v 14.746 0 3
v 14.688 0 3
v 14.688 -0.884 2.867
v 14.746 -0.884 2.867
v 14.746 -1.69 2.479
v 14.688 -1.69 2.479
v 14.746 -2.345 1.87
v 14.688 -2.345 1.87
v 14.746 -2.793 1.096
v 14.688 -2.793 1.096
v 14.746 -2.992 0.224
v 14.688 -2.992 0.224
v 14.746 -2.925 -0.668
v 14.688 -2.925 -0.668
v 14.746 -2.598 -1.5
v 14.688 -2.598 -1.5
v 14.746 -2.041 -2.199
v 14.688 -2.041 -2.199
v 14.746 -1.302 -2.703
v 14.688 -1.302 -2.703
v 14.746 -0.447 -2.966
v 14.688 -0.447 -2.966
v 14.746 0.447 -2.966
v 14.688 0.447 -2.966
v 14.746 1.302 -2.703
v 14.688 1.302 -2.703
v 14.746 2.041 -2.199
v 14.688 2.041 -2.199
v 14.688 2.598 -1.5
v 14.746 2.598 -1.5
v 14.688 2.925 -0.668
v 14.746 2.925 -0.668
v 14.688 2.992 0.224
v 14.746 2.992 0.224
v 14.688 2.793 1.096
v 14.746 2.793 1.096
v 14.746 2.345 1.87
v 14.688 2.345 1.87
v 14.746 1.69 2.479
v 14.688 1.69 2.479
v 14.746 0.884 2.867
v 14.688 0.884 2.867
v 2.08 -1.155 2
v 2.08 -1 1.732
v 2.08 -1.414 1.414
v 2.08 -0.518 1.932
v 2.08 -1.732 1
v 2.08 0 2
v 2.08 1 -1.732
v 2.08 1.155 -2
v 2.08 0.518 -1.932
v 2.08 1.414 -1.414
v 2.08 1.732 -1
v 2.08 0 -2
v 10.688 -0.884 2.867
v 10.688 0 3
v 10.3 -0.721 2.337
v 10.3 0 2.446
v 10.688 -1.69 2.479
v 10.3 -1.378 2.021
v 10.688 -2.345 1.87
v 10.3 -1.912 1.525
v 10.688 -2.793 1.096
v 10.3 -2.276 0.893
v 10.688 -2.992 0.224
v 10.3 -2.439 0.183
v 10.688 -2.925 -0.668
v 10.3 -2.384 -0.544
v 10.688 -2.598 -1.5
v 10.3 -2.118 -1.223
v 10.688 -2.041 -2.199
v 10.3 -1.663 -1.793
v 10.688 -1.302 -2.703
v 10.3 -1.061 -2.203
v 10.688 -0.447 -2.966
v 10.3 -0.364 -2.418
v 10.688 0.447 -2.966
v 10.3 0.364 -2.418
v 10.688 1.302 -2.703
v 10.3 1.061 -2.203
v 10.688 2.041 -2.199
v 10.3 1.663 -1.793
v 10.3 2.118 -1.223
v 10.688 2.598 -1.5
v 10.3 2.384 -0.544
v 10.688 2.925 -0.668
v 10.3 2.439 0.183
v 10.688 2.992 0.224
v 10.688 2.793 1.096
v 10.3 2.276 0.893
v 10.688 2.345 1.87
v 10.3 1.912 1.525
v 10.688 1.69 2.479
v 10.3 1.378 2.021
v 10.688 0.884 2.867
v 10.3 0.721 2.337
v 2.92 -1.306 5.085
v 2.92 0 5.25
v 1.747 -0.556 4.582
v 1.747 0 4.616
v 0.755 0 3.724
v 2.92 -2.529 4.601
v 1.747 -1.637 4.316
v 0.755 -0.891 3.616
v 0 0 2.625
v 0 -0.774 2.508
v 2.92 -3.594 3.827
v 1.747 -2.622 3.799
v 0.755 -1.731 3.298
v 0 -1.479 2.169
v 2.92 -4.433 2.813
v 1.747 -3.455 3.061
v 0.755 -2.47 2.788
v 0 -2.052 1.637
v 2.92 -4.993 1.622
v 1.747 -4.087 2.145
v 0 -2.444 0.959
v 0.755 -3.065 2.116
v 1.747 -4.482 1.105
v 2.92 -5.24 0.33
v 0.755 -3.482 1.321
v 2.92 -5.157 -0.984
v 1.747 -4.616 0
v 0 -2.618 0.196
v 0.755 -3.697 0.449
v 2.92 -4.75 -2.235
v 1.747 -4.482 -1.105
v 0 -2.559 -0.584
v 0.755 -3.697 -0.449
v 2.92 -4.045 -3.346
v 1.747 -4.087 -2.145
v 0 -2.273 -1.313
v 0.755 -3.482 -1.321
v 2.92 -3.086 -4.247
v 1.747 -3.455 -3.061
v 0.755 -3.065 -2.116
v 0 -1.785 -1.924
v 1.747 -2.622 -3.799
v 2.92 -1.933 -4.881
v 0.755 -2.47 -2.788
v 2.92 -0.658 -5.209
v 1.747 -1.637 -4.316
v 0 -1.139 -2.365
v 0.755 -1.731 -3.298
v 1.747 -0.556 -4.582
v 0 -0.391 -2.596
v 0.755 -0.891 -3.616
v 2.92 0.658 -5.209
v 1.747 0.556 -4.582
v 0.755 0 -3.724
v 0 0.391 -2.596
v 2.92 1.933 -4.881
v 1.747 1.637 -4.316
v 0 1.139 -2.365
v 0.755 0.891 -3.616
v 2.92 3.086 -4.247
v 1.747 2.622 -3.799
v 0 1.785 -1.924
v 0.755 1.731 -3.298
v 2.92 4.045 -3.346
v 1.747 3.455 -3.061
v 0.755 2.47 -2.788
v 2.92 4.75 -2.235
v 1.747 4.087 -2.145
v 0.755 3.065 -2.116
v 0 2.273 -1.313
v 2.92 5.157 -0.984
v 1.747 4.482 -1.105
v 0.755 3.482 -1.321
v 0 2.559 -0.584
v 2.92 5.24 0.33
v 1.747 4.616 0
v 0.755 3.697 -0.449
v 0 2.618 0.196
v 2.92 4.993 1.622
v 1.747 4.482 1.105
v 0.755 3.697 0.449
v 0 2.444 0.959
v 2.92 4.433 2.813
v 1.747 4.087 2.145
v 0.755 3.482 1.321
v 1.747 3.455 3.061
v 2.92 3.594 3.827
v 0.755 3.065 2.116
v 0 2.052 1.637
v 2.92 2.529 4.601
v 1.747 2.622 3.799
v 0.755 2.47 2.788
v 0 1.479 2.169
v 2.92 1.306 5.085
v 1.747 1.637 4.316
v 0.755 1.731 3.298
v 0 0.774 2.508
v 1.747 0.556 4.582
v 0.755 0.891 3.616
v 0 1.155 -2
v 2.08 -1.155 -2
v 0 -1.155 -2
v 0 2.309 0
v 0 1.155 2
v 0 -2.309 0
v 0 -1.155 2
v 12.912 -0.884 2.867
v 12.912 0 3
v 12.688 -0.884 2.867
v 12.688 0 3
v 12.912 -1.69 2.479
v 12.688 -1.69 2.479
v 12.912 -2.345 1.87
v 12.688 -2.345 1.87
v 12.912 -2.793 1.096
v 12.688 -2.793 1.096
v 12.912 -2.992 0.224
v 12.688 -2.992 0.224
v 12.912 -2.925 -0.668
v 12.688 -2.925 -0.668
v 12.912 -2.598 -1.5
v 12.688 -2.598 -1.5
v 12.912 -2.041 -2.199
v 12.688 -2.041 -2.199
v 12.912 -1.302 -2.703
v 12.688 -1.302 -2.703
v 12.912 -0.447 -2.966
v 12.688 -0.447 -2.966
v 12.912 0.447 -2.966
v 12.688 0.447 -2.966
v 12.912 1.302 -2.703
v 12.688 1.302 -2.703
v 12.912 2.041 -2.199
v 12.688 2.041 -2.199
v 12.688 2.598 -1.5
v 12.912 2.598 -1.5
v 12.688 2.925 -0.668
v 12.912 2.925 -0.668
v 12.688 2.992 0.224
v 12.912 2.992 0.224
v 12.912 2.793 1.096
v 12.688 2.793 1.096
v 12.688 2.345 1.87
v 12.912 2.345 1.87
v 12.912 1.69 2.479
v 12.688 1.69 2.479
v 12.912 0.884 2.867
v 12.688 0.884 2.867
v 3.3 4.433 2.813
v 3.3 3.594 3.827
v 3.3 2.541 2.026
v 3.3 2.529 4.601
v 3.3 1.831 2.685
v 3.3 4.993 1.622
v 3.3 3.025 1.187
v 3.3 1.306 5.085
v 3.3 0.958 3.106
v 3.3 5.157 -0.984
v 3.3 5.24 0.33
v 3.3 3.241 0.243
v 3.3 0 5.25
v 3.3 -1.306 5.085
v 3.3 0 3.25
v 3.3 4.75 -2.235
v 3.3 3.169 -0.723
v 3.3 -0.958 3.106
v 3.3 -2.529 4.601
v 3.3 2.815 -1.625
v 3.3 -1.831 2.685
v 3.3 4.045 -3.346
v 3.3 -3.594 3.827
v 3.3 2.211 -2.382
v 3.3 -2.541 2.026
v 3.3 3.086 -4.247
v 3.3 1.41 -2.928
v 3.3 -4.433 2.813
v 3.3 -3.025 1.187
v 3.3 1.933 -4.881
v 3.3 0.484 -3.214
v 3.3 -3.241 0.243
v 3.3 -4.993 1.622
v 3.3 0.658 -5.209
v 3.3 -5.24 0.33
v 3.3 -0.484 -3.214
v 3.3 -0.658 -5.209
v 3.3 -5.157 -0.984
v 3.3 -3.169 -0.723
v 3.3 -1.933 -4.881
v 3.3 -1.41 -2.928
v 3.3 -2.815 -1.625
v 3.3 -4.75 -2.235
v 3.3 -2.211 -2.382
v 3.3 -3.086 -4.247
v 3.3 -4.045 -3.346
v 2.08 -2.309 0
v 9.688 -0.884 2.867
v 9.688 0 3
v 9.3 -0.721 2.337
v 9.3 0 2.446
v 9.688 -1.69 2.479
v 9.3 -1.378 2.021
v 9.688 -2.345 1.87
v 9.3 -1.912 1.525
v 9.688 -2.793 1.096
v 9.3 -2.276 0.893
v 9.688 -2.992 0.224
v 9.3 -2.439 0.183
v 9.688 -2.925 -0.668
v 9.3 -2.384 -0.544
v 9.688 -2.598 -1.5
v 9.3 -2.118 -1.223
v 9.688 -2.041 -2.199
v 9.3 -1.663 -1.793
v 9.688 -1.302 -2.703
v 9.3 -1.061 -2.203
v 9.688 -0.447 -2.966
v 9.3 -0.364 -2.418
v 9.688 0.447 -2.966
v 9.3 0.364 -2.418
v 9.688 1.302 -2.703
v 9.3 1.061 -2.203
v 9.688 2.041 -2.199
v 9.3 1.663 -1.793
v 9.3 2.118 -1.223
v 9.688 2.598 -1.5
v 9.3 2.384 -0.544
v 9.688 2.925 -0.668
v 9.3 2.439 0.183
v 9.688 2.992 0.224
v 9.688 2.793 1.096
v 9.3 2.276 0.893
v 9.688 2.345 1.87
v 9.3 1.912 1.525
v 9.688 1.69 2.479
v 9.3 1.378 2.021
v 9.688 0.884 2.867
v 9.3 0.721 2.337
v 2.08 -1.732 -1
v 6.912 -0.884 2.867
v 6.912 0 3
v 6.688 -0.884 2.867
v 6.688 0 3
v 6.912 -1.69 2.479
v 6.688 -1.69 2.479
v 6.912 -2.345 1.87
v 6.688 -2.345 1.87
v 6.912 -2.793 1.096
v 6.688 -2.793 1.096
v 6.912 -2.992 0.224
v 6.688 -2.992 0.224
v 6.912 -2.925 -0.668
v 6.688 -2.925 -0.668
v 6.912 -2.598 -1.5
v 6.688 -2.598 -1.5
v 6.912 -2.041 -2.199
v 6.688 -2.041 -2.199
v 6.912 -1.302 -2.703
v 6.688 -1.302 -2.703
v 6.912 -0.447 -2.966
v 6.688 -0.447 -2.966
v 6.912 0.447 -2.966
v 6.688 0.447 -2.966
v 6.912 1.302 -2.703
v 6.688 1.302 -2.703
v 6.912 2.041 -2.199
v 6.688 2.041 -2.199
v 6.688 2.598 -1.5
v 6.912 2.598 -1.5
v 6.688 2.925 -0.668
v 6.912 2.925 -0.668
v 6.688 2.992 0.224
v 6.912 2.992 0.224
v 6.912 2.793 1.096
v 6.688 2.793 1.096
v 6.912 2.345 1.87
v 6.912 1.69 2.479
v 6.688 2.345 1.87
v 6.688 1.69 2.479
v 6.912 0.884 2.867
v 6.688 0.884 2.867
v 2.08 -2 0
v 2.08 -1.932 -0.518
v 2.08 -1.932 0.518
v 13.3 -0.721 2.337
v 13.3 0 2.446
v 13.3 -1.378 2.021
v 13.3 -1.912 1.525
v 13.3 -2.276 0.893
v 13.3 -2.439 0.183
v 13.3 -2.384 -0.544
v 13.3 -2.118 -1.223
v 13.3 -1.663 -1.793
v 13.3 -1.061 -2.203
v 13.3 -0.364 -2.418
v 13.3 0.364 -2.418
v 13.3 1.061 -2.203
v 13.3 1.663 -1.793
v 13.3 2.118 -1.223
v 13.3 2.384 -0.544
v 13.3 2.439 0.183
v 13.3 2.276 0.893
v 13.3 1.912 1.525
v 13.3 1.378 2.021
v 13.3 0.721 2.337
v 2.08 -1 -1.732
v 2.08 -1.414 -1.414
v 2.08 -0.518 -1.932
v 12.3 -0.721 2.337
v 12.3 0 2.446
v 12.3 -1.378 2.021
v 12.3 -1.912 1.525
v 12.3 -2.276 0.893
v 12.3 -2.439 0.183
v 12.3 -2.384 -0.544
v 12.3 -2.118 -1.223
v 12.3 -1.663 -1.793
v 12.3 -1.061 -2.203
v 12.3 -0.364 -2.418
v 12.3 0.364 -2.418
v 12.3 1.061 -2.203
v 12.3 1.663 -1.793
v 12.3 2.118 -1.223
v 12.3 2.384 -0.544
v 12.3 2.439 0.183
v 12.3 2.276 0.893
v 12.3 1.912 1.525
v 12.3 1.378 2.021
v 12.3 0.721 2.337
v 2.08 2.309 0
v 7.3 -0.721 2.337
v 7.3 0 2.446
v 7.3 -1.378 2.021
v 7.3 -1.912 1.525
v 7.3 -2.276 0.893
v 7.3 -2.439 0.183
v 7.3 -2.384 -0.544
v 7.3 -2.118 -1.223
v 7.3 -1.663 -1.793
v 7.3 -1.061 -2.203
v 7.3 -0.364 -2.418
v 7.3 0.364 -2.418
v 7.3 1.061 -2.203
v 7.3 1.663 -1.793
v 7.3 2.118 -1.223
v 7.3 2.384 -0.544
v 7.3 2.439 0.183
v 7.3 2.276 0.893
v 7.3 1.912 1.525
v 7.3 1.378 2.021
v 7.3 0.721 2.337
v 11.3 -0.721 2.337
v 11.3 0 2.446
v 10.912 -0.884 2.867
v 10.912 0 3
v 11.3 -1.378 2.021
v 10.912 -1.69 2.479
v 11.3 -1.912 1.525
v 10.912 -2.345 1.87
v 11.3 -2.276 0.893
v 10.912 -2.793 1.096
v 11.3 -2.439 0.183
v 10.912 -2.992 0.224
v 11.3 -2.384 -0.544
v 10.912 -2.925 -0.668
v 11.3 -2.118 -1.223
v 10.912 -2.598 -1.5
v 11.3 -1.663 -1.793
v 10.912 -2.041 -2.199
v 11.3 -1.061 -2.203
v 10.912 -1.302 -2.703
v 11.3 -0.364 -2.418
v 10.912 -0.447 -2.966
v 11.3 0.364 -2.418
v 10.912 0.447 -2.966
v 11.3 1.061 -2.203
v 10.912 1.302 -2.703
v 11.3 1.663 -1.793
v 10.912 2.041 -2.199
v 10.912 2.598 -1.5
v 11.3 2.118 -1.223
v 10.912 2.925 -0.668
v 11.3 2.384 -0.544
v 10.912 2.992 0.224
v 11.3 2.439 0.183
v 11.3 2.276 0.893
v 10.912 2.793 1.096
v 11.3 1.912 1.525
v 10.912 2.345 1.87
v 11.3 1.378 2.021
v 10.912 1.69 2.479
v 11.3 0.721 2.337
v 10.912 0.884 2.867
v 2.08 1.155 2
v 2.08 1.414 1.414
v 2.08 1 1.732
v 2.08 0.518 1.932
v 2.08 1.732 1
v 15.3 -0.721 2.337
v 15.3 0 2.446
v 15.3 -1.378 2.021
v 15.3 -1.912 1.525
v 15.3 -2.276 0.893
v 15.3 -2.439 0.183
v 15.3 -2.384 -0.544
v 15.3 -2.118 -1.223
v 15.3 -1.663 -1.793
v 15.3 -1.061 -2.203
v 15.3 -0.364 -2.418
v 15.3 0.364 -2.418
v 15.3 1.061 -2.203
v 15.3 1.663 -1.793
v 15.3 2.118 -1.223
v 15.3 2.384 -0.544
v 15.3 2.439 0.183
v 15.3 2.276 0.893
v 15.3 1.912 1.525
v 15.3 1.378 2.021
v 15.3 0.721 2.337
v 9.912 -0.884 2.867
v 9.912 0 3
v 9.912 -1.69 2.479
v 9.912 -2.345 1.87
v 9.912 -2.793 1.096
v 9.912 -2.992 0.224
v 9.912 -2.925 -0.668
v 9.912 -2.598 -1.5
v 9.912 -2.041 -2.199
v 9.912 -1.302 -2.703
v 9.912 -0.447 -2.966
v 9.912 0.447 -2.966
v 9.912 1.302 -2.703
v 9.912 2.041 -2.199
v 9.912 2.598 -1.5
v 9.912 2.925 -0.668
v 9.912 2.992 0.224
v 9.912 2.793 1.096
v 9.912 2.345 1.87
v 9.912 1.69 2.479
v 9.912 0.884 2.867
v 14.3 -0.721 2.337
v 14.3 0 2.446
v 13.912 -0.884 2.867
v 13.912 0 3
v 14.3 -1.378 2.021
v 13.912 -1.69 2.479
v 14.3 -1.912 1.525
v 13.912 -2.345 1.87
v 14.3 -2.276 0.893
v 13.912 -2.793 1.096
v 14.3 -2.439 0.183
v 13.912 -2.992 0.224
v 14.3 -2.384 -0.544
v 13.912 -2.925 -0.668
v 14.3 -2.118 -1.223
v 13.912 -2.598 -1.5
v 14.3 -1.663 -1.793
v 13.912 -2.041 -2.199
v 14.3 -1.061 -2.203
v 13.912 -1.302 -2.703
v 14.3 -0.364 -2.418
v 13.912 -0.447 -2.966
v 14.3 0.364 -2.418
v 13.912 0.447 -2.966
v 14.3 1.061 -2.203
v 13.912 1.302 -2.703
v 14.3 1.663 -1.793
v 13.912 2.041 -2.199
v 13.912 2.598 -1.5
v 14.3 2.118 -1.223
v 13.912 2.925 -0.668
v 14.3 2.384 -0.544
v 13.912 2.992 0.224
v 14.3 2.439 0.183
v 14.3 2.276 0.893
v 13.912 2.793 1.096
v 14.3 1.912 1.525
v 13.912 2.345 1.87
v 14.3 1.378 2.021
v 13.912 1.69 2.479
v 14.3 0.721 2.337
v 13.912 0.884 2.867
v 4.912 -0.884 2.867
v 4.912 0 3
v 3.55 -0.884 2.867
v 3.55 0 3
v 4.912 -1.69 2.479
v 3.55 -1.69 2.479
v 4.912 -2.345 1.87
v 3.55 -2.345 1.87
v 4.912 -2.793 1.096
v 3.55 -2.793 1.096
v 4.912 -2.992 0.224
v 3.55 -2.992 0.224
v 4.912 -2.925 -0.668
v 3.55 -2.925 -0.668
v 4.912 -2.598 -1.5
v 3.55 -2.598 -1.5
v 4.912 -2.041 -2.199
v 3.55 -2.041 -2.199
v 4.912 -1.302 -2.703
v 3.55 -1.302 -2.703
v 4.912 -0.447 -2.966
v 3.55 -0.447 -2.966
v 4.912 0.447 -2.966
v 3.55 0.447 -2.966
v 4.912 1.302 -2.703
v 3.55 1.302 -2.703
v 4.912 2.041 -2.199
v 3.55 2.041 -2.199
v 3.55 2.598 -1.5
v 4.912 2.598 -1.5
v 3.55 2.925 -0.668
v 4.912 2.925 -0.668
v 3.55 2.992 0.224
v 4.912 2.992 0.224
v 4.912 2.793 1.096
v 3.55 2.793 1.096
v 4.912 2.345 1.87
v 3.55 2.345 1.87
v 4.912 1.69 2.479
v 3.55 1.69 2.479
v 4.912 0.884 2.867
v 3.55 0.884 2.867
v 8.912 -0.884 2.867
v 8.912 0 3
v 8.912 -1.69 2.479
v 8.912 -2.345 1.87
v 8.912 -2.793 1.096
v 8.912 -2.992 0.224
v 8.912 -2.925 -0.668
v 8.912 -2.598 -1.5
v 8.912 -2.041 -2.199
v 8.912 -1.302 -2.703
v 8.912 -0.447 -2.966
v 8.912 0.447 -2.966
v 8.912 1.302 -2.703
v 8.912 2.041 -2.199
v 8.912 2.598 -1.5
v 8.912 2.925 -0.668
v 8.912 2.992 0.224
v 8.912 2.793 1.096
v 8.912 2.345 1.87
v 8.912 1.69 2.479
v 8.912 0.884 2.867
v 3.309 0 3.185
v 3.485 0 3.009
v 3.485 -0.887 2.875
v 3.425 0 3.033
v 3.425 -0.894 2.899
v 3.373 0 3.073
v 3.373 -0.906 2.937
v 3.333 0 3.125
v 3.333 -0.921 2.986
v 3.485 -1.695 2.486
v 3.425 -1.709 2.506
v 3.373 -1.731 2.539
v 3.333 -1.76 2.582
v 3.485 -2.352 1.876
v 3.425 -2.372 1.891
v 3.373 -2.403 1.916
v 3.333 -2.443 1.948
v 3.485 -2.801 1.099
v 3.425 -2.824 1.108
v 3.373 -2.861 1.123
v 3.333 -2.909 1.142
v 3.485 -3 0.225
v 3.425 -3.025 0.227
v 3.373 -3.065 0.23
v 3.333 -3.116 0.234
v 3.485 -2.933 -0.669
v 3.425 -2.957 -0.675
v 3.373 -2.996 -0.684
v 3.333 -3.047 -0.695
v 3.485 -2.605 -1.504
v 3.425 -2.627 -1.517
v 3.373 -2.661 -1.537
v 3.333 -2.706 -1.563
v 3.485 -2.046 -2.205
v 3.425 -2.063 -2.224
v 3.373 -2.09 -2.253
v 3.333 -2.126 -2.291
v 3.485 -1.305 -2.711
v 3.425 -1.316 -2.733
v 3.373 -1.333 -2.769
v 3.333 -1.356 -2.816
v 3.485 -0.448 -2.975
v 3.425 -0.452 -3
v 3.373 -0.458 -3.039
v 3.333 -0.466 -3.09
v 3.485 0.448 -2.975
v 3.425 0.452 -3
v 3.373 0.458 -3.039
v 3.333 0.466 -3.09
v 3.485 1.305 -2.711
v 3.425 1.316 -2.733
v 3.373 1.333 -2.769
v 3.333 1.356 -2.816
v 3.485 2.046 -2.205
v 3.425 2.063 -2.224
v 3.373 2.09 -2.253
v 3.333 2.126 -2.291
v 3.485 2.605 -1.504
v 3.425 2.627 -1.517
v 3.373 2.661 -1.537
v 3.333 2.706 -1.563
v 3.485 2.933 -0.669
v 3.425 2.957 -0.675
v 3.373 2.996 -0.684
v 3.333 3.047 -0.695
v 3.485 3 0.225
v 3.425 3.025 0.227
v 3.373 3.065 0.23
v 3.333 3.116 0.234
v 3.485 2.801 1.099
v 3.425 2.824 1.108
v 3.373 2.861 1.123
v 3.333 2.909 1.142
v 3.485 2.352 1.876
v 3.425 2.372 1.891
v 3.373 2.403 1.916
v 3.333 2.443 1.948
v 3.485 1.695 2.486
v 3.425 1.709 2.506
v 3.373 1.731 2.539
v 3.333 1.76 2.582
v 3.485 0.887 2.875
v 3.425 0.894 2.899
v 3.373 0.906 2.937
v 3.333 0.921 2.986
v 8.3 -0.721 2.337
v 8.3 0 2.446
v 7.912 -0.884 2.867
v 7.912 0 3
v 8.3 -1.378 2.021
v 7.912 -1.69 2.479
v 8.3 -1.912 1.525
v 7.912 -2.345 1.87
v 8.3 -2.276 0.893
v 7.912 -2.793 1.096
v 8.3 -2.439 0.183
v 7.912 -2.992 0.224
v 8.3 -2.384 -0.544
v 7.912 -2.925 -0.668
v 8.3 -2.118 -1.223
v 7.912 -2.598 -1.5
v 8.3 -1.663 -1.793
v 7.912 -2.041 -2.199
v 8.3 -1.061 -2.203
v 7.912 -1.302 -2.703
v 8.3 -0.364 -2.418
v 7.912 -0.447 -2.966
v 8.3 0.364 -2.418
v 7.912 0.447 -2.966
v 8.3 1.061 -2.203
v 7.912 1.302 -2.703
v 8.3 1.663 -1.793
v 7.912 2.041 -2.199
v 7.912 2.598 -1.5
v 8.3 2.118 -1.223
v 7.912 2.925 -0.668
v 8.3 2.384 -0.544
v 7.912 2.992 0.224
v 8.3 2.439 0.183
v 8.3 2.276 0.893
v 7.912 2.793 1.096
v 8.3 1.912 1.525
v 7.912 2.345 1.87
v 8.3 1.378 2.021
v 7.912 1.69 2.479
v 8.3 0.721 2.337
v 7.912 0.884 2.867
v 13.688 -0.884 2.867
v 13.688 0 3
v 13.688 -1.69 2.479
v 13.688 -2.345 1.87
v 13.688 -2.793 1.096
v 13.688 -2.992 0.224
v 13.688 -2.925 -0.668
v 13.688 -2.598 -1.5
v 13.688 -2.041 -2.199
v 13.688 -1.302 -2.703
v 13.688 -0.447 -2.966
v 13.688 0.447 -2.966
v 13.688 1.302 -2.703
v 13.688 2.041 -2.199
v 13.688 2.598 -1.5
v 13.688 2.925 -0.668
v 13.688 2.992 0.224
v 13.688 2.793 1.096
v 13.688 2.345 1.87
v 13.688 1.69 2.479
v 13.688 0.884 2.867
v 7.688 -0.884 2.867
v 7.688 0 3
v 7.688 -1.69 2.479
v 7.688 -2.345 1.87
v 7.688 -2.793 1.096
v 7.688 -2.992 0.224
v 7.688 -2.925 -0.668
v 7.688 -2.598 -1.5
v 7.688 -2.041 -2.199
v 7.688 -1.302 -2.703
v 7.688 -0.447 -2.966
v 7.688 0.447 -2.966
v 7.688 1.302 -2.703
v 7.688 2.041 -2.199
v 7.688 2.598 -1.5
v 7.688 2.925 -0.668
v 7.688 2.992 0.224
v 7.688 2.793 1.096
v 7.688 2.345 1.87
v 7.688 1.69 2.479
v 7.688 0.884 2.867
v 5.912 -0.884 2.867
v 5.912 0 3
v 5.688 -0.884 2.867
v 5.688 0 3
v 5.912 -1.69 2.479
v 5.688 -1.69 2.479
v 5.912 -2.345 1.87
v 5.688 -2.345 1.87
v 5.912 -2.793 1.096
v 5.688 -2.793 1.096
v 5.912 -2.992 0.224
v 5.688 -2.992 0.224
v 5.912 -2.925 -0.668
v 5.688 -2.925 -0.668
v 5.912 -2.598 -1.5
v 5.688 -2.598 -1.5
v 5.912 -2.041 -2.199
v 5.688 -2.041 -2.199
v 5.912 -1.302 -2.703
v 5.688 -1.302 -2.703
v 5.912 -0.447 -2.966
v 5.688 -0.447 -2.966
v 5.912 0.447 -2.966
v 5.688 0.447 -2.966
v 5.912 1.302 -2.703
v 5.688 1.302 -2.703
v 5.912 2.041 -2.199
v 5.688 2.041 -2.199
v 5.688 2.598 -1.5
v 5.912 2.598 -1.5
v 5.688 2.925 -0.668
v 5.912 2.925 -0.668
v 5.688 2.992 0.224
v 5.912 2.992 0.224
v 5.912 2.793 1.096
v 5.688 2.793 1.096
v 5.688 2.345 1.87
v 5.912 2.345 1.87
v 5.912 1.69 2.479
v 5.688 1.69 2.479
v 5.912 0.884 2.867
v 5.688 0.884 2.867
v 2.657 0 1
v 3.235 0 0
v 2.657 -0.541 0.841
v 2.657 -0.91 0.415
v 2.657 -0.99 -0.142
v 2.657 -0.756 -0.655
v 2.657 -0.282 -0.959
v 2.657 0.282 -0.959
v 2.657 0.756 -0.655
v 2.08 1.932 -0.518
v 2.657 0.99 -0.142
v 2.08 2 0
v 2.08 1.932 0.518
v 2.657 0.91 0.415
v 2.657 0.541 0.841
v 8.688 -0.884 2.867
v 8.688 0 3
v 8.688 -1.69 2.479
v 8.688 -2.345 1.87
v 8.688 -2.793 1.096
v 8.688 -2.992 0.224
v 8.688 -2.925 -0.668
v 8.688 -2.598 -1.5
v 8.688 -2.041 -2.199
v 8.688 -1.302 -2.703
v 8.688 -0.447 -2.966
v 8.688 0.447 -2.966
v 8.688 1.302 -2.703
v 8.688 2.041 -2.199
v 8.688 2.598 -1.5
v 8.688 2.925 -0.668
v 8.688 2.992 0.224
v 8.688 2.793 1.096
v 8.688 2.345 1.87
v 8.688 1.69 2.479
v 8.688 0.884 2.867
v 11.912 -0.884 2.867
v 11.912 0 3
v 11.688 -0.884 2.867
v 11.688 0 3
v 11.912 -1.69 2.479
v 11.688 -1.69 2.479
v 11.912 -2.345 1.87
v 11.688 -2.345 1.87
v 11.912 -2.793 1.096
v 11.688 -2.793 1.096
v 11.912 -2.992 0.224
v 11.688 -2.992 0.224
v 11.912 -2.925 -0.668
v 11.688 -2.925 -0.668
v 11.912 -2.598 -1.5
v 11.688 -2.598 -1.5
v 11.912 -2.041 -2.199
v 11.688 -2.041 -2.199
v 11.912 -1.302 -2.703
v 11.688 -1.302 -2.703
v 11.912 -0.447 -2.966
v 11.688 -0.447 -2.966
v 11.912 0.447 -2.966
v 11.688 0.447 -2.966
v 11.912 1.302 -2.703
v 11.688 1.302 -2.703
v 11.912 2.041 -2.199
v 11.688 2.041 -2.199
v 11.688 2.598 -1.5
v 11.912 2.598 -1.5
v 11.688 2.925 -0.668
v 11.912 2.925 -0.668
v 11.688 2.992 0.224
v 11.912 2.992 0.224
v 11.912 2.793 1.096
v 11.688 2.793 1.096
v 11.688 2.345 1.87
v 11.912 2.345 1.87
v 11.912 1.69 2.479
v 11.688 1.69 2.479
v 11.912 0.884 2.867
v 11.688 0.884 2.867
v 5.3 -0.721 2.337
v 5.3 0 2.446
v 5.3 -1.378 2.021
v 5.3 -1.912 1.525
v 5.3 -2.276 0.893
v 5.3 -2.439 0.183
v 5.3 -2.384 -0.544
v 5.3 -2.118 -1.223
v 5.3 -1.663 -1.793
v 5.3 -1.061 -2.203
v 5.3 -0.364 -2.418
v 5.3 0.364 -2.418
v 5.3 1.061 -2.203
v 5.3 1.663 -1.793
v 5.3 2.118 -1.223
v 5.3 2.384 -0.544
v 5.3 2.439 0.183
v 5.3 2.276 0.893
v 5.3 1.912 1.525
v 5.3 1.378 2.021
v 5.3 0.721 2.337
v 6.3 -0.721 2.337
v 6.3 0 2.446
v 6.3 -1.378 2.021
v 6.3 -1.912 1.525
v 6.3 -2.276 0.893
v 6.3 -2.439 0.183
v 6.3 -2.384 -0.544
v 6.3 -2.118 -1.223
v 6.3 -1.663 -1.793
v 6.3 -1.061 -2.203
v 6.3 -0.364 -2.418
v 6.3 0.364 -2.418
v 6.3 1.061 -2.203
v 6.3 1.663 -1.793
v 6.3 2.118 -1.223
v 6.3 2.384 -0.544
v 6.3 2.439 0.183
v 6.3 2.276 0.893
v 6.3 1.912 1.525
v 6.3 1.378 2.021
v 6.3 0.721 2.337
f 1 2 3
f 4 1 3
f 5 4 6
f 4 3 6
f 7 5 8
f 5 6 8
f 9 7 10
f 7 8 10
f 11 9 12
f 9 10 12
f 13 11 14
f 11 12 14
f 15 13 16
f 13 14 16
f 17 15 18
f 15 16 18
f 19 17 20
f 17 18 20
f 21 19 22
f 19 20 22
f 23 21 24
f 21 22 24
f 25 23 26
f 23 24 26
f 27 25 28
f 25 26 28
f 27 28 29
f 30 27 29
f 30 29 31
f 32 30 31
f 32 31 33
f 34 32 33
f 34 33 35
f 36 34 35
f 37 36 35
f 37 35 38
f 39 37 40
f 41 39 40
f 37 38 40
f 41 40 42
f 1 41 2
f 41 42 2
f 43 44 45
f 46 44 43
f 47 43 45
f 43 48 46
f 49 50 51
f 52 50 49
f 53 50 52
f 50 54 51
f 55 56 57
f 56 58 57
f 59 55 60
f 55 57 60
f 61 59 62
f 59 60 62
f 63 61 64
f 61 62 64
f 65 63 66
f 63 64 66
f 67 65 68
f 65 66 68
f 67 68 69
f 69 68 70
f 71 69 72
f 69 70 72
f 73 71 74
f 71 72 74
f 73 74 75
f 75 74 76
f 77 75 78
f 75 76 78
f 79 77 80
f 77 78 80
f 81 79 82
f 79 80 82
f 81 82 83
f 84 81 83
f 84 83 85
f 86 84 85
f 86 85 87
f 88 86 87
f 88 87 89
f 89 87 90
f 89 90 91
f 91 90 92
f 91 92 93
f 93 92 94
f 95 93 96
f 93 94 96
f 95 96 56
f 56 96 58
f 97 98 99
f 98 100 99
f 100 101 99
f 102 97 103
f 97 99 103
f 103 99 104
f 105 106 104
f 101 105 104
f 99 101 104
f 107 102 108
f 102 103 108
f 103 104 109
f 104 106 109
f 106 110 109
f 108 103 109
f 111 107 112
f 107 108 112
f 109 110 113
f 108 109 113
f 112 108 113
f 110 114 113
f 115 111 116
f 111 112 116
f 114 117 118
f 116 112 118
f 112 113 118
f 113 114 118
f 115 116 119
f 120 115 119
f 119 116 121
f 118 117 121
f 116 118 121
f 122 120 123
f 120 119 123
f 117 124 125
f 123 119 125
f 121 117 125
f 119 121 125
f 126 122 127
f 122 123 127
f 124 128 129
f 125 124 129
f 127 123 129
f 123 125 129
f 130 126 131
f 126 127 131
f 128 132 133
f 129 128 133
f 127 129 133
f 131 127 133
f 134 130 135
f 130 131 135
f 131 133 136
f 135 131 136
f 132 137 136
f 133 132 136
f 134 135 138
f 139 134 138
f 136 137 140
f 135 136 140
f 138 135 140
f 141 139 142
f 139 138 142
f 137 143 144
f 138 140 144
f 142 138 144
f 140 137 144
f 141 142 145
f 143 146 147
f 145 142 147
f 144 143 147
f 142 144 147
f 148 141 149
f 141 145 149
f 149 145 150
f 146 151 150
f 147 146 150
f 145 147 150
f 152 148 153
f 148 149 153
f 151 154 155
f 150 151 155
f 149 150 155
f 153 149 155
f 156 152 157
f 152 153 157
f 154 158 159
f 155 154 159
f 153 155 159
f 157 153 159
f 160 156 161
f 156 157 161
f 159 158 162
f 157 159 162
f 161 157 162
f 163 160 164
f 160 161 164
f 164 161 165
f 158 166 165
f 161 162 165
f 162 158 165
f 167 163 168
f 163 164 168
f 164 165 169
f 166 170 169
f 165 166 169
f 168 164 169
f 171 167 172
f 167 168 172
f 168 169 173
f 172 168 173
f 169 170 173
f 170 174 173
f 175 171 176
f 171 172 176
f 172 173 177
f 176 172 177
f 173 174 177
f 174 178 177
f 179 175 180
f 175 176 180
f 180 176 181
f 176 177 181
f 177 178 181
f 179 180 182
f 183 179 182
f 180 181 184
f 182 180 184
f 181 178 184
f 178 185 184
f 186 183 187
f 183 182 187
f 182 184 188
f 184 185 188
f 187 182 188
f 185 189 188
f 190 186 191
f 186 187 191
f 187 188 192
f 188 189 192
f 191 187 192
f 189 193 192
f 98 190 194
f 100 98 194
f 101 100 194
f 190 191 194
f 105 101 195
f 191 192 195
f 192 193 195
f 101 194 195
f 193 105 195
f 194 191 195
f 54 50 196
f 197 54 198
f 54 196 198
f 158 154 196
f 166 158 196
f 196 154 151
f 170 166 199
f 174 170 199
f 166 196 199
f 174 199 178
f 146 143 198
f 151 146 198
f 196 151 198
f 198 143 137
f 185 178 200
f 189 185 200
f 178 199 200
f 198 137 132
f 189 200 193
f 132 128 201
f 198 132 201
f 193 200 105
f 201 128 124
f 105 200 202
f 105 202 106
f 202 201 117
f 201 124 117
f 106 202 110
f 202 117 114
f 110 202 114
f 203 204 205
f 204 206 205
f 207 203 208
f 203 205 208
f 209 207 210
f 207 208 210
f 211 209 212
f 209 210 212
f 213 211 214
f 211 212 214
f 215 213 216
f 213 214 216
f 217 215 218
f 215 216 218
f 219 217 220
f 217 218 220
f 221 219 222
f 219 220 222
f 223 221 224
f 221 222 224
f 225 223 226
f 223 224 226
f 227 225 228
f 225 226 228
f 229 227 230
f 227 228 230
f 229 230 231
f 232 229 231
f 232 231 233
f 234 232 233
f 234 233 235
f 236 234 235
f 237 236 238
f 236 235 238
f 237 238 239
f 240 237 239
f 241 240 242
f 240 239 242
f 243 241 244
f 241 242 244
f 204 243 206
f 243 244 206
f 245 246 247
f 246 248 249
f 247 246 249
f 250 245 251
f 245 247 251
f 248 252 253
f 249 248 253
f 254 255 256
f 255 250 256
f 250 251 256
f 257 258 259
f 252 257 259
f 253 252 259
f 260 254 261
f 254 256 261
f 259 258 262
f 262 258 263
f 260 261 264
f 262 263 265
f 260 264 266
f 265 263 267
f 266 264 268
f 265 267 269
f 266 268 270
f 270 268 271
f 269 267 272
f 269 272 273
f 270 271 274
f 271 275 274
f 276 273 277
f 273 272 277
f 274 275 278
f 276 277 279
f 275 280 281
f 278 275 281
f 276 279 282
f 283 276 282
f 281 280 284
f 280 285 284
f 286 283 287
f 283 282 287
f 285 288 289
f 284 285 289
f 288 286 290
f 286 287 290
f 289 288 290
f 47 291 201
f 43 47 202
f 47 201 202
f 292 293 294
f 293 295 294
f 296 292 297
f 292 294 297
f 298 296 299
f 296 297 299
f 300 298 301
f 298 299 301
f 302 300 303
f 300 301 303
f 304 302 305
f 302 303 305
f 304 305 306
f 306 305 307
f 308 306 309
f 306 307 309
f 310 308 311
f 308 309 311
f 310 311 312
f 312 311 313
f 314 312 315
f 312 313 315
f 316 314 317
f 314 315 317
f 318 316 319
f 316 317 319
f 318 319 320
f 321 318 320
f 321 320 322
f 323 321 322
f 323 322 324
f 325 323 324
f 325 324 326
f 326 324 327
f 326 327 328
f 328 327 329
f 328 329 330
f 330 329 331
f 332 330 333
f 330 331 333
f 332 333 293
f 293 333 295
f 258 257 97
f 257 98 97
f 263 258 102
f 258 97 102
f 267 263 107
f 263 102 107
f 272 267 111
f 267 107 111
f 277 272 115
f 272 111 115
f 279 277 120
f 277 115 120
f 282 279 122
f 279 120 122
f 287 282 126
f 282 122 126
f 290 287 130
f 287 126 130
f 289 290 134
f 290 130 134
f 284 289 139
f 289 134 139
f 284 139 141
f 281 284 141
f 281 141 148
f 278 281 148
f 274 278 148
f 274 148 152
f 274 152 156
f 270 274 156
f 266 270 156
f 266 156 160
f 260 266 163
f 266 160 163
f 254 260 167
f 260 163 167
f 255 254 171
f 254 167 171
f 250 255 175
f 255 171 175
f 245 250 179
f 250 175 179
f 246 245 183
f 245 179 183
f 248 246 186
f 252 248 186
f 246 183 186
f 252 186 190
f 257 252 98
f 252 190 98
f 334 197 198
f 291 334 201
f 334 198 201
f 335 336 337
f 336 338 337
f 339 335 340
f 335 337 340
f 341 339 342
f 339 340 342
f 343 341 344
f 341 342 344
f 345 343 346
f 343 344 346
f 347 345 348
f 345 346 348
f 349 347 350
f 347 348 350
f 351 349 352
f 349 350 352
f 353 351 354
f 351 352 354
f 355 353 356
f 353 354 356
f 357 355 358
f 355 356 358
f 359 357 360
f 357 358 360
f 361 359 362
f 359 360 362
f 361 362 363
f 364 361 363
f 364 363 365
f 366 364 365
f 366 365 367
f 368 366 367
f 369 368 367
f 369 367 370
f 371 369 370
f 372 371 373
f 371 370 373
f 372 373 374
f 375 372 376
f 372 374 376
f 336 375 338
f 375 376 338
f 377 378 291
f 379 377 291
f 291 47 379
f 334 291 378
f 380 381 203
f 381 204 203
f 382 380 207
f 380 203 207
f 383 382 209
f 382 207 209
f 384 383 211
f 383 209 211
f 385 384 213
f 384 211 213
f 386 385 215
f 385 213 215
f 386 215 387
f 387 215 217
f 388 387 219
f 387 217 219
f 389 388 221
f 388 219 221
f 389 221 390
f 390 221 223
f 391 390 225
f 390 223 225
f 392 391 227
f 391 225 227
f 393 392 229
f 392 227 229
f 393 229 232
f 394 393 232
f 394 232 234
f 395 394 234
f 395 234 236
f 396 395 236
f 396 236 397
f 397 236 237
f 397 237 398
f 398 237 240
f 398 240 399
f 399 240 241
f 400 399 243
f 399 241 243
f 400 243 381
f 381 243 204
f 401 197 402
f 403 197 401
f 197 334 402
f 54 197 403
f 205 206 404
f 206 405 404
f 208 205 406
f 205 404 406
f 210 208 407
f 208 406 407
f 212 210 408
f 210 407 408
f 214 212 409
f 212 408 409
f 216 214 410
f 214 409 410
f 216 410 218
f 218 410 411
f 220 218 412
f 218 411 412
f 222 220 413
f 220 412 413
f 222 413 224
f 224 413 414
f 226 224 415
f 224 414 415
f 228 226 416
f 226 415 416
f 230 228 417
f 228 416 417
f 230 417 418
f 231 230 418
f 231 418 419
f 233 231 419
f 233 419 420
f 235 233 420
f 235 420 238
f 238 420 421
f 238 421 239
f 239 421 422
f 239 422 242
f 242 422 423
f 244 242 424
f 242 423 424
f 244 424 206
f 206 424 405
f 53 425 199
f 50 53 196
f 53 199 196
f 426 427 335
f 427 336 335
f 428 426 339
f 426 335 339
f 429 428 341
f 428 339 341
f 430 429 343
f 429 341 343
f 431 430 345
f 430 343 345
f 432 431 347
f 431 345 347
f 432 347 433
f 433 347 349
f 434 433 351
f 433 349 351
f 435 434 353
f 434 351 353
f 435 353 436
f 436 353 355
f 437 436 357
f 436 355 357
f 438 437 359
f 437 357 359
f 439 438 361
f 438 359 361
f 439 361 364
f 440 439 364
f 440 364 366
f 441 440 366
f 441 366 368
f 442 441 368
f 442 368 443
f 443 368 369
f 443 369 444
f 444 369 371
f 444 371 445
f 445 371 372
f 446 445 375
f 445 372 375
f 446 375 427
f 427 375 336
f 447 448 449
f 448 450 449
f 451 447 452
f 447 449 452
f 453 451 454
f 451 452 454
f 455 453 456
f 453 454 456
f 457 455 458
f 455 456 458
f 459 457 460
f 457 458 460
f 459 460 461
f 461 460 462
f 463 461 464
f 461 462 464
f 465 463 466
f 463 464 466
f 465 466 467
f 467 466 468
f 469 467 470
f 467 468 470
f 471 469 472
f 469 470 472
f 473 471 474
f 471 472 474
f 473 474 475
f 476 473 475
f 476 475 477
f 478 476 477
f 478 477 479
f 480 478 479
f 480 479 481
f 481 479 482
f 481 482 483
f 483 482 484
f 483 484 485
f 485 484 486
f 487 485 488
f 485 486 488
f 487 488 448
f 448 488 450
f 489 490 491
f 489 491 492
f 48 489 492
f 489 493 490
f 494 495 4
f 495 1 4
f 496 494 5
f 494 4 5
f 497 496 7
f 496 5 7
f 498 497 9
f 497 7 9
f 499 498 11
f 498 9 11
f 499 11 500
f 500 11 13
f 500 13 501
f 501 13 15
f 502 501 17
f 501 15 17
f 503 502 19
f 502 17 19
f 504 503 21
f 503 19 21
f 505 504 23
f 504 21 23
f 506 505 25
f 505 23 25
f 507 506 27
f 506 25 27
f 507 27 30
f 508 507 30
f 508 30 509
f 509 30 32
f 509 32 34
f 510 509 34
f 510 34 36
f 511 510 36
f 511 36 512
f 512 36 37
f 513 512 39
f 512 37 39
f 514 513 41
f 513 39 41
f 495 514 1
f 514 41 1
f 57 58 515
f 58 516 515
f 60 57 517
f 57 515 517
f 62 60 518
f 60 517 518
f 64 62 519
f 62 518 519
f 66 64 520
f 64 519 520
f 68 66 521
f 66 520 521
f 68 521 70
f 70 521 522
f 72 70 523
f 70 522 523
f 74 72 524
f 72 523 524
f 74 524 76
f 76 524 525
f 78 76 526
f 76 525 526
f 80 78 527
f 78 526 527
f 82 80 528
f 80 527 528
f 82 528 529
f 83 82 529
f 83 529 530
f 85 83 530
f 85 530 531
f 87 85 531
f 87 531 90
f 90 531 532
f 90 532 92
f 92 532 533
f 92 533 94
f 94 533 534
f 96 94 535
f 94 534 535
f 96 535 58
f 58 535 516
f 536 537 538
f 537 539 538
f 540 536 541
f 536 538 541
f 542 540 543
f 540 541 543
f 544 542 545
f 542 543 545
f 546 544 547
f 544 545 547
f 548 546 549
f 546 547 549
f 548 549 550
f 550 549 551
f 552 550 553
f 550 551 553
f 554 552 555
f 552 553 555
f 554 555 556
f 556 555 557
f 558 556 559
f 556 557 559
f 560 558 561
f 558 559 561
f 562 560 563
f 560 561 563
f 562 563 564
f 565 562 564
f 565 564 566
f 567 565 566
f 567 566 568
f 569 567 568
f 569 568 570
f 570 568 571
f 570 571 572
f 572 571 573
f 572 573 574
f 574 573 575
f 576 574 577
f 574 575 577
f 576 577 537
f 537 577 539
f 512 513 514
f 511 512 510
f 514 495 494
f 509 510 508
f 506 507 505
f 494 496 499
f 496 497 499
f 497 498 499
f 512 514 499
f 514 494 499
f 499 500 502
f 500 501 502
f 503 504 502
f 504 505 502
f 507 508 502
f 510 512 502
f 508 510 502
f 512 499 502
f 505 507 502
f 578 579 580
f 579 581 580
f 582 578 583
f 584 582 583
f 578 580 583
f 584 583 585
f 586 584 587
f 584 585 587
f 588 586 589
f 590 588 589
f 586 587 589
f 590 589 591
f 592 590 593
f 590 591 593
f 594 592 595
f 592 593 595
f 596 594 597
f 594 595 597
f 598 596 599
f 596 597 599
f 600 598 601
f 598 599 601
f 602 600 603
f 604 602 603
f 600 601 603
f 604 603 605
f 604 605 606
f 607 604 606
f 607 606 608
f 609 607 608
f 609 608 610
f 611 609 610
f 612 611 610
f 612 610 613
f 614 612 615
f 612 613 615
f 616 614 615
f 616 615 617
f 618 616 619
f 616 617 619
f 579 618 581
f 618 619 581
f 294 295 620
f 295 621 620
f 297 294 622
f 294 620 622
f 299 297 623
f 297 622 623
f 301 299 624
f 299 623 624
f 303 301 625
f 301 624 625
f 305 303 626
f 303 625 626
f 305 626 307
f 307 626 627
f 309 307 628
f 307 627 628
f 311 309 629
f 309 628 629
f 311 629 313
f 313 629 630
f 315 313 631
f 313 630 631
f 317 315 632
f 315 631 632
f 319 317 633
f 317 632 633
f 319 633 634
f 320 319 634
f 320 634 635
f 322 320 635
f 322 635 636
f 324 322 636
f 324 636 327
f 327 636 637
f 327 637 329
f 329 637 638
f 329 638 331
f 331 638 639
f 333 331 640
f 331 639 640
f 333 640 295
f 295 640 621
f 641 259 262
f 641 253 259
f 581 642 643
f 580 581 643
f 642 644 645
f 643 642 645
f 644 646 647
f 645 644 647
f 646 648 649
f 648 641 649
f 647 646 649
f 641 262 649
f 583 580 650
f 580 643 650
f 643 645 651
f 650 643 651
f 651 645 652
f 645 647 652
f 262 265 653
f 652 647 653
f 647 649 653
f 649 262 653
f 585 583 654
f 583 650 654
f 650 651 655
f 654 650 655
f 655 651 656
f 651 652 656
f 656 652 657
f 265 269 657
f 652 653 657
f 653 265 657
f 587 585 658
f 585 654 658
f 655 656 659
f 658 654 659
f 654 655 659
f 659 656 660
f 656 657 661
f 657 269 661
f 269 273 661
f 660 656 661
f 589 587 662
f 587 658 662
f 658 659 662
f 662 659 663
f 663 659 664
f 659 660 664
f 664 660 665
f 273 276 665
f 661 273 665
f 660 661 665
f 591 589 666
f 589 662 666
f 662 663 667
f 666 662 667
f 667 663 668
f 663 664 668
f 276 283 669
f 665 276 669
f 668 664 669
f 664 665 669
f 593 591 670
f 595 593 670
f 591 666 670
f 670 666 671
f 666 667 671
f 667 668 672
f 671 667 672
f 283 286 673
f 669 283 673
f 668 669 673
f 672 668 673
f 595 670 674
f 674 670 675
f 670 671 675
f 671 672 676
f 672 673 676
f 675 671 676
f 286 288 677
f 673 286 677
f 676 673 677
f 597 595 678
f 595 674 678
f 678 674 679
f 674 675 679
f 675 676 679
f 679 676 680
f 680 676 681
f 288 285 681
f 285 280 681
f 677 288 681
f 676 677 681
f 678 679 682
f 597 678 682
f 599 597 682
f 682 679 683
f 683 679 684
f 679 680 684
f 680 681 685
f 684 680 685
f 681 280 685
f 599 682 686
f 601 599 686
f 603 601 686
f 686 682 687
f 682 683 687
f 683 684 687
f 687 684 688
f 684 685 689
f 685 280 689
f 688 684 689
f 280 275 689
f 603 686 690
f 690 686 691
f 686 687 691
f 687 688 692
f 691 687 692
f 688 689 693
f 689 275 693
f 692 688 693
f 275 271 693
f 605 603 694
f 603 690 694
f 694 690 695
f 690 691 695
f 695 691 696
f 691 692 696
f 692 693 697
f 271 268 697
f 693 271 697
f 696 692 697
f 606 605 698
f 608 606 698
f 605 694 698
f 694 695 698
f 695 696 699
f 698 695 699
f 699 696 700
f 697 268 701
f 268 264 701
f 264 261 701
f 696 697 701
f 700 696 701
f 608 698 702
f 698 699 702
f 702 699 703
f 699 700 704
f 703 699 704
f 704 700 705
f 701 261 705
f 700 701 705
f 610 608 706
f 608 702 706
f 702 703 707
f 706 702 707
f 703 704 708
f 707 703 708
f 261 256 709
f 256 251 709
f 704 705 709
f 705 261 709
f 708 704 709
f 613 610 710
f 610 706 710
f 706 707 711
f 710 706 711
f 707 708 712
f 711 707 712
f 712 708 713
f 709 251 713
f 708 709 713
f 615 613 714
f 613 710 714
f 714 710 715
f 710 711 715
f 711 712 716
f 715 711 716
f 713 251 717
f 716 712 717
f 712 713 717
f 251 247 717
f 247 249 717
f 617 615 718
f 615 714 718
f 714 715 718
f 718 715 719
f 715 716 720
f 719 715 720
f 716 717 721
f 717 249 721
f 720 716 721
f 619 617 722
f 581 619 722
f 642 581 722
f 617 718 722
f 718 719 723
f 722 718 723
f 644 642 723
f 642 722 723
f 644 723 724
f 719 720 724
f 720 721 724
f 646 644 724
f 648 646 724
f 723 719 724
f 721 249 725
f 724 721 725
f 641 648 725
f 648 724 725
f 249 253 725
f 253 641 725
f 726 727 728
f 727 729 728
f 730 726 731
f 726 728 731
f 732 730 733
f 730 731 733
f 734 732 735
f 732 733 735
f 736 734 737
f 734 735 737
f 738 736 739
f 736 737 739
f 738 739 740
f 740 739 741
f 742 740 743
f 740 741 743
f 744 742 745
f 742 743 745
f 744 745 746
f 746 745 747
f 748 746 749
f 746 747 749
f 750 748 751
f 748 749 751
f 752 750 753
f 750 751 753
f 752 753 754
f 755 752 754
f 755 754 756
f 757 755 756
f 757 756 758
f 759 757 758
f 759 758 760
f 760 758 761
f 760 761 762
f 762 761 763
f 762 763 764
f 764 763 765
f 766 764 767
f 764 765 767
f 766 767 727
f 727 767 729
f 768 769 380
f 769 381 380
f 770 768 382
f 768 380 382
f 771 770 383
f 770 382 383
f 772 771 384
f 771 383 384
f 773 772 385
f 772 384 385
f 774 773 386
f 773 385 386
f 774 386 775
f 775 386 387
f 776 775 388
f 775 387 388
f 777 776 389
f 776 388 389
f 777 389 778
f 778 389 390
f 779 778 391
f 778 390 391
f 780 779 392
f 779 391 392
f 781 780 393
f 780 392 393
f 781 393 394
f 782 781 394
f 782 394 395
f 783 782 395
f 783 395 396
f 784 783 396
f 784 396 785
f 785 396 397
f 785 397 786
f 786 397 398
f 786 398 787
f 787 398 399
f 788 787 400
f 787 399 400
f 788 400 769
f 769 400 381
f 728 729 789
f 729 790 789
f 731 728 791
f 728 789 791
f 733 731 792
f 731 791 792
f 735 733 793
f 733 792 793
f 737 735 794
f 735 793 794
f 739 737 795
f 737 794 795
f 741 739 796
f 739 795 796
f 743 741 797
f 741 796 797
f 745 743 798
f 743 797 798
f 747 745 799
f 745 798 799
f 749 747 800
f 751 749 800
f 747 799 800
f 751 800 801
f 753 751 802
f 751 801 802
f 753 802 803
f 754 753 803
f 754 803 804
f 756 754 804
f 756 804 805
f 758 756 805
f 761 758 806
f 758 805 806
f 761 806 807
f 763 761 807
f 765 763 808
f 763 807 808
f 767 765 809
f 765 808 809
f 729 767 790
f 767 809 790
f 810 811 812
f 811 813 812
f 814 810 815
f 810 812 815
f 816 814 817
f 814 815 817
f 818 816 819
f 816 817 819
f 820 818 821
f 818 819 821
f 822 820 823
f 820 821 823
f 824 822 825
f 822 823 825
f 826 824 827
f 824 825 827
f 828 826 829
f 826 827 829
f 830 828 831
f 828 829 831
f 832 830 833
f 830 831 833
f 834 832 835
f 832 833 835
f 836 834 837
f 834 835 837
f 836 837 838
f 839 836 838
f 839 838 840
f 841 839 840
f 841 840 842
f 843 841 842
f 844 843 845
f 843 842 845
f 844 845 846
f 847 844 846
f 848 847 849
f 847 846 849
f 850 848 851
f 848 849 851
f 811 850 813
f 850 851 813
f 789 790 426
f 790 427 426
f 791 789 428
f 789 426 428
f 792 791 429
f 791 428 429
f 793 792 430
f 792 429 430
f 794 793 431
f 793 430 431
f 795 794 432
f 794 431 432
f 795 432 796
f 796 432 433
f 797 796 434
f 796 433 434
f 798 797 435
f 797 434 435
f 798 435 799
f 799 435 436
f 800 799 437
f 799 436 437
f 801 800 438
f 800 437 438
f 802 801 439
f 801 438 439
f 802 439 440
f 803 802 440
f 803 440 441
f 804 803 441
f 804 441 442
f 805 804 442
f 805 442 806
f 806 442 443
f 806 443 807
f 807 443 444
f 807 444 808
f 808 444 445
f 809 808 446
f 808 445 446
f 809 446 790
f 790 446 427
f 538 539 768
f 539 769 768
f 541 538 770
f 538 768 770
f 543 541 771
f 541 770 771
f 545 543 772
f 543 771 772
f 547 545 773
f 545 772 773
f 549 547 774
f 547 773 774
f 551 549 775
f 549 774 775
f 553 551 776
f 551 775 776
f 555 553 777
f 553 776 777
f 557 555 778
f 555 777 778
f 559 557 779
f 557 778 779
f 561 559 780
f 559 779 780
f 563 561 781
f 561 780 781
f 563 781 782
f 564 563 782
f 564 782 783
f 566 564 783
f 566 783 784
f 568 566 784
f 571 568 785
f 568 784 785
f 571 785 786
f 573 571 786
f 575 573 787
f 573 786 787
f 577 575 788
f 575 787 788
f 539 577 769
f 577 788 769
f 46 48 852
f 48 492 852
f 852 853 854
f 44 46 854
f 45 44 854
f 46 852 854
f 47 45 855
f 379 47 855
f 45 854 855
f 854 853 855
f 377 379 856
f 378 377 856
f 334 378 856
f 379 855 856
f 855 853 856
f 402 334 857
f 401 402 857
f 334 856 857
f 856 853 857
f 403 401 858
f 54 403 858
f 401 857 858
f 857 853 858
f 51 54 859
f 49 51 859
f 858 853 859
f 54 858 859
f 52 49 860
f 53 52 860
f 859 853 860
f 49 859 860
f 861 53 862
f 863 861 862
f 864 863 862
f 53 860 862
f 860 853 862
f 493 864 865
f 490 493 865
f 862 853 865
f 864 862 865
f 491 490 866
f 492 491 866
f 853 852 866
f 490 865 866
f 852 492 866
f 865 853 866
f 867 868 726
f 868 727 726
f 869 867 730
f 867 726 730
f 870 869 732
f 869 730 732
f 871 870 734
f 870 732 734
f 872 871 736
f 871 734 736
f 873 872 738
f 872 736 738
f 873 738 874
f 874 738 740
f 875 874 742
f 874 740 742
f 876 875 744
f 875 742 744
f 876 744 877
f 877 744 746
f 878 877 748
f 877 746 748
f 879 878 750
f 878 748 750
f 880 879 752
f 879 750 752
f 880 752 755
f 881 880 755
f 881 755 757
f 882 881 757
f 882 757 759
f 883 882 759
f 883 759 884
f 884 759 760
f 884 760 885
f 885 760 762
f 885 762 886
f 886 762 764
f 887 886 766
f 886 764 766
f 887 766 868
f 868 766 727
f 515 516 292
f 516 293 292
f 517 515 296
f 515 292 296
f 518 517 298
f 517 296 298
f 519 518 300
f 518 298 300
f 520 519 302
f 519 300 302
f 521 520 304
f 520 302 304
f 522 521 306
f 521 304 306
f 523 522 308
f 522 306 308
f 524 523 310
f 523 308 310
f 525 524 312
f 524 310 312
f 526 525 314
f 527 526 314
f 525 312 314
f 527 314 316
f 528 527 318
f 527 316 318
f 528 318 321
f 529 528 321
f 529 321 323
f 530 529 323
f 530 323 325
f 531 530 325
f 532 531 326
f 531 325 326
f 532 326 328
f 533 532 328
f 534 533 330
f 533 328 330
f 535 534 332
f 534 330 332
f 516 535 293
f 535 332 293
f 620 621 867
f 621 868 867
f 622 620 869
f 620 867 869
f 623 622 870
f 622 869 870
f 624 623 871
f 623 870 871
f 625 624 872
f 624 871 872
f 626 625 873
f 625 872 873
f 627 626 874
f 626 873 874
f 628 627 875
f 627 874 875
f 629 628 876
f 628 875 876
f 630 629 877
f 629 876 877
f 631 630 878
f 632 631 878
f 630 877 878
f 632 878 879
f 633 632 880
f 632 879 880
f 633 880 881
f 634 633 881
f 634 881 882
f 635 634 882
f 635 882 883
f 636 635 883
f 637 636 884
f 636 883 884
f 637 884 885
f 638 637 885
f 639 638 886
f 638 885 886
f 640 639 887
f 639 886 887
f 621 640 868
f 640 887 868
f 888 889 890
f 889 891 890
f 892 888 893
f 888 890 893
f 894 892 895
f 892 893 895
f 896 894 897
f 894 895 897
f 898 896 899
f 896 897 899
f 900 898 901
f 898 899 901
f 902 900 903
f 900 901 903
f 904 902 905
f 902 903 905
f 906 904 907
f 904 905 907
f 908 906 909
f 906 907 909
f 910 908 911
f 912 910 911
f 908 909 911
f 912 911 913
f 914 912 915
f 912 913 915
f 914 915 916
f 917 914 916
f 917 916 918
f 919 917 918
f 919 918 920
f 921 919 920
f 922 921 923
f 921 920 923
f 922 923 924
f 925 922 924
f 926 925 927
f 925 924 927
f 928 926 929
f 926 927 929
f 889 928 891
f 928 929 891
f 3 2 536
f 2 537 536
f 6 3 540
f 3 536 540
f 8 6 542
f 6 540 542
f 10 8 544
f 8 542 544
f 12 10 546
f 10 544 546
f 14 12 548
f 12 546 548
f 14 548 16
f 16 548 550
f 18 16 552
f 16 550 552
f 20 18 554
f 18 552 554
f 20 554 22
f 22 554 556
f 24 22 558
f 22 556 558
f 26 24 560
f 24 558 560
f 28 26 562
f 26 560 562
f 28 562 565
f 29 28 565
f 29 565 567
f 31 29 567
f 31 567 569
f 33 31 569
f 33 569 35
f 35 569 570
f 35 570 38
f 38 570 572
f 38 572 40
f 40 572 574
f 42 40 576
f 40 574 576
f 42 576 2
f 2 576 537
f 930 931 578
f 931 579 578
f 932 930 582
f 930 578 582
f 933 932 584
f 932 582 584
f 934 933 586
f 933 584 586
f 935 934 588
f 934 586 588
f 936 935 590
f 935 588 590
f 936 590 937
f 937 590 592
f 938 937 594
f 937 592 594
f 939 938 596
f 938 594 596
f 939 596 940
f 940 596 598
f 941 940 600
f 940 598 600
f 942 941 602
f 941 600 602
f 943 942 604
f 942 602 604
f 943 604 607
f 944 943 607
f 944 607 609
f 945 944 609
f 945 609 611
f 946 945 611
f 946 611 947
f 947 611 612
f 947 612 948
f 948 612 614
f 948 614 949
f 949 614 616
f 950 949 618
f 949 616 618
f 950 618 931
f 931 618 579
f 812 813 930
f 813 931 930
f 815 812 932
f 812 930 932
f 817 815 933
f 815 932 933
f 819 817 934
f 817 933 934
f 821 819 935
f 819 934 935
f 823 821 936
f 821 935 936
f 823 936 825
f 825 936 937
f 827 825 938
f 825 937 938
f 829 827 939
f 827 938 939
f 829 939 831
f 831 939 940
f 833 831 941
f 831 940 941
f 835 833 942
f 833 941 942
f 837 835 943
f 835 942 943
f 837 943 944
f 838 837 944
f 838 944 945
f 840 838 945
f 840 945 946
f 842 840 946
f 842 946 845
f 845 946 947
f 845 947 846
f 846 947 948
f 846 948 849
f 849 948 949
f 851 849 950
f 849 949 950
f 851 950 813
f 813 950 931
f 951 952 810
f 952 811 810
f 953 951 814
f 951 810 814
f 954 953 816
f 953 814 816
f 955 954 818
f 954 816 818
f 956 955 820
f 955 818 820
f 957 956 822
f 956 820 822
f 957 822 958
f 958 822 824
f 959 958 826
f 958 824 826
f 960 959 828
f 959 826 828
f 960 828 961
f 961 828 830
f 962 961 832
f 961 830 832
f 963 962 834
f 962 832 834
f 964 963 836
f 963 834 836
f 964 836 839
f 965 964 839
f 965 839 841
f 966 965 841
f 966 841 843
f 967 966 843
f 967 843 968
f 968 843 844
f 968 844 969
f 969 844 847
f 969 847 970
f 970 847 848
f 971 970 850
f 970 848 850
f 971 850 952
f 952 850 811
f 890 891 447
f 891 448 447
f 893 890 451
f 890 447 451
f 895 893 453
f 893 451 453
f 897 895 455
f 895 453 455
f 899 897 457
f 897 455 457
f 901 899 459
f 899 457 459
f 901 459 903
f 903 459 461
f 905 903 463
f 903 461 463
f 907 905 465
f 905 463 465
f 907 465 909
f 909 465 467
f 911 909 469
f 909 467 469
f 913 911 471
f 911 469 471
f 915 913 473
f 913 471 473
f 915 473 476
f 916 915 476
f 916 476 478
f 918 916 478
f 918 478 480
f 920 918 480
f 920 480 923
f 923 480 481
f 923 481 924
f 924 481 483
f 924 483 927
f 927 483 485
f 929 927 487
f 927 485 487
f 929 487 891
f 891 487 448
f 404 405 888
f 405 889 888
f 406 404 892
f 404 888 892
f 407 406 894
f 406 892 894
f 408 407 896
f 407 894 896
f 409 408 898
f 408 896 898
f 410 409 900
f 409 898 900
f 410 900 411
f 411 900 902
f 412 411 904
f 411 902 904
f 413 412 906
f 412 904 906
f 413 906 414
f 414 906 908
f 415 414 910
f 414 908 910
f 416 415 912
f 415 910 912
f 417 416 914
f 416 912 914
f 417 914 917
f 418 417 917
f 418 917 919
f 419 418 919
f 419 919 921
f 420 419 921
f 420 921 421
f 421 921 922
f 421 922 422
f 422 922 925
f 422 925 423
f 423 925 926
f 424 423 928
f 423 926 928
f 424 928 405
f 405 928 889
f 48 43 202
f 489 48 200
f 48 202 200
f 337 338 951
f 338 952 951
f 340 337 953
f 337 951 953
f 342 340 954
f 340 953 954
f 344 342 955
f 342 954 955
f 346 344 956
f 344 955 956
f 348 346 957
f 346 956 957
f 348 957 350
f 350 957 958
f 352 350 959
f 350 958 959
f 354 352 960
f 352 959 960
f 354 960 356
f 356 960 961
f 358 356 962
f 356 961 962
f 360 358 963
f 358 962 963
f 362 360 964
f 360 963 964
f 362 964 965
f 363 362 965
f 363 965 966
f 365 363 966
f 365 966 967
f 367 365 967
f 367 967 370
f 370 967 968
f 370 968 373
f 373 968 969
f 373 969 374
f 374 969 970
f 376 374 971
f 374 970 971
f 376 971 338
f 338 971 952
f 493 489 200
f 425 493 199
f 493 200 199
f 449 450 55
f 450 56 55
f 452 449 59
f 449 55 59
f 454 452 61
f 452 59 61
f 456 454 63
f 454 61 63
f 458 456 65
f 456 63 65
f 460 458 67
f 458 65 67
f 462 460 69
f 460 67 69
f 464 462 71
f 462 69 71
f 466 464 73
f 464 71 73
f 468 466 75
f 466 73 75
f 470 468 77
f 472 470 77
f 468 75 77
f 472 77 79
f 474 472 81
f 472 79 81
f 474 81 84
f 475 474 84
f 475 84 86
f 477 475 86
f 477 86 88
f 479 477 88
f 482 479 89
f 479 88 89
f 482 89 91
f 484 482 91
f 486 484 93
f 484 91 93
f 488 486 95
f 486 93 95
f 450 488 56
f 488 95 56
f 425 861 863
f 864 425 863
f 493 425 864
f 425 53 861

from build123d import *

# Parameters (mm, degrees)
FILLET1_R       = 0.25
HEX_2_DEPTH     = 2.08
THDSCHPAT_COUNT = 10
THDSCHPAT_PITCH = 1


with BuildPart() as part:
    # BodySke → BaseBody (revolve)
    with BuildSketch(Plane.XY, mode=Mode.PRIVATE) as basebody_sk:
        with BuildLine():
            Line((15.3, 0), (15.3, 2.4455))
            Line((15.3, 2.4455), (14.7455, 3))
            Line((14.7455, 3), (3.3, 3))
            Line((3.3, 3), (3.3, 5.25))
            Line((3.3, 5.25), (2.92, 5.25))
            ThreePointArc((2.92, 5.25), (1.224500646, 4.199464996), (0, 2.625))
            Line((0, 2.625), (0, 0))
            Line((0, 0), (15.3, 0))
        make_face()
    revolve(basebody_sk.sketch.rotate(Axis((0, 0, 0), (1, 0, 0)), 90), axis=Axis((0, 0, 0), (1, 0, 0)))

    # Fillet1
    fillet1_edges = [part.edges().sort_by_distance(p)[0] for p in [
        (3.3, 0, -3),
    ]]
    fillet(fillet1_edges, radius=FILLET1_R)

    # Sketch2 → PreBroach (revolve, cut)
    with BuildSketch(Plane.XY, mode=Mode.PRIVATE) as prebroach_sk:
        Polygon((0, 2), (2.08, 2), (3.234700538, 0), (0, 0), align=None)
    revolve(prebroach_sk.sketch.rotate(Axis((0, 0, 0), (1, 0, 0)), 90), axis=Axis((0, 0, 0), (1, 0, 0)), mode=Mode.SUBTRACT)

    # Sketch3 → Hex 2 (cut)
    with BuildSketch(Plane(origin=(0, 0, 0), x_dir=(0, 0, -1), z_dir=(1, 0, 0))):
        Polygon((-2, -1.154700538), (-2, 1.154700538), (0, 2.309401077), (2, 1.154700538), (2, -1.154700538), (0, -2.309401077), align=None)
    extrude(amount=HEX_2_DEPTH, mode=Mode.SUBTRACT)

    # ThdSchSke → ThreadSchematic (revolve, cut)
    with BuildSketch(Plane.XY, mode=Mode.PRIVATE) as threadschematic_sk:
        Polygon((5.3, -2.4455), (4.91173492, -3), (4.91173492, -3.75), (5.68826508, -3.75), (5.68826508, -3), align=None)
    threadschematic = revolve(threadschematic_sk.sketch.rotate(Axis((-3.175, 0, 0), (1, 0, 0)), 270), axis=Axis((-3.175, 0, 0), (1, 0, 0)), mode=Mode.SUBTRACT)

    # ThdSchPat: ThreadSchematic ×10
    with Locations(*[(i * THDSCHPAT_PITCH, 0, 0) for i in range(1, THDSCHPAT_COUNT)]):
        add(threadschematic, mode=Mode.SUBTRACT)


solid = part.part
